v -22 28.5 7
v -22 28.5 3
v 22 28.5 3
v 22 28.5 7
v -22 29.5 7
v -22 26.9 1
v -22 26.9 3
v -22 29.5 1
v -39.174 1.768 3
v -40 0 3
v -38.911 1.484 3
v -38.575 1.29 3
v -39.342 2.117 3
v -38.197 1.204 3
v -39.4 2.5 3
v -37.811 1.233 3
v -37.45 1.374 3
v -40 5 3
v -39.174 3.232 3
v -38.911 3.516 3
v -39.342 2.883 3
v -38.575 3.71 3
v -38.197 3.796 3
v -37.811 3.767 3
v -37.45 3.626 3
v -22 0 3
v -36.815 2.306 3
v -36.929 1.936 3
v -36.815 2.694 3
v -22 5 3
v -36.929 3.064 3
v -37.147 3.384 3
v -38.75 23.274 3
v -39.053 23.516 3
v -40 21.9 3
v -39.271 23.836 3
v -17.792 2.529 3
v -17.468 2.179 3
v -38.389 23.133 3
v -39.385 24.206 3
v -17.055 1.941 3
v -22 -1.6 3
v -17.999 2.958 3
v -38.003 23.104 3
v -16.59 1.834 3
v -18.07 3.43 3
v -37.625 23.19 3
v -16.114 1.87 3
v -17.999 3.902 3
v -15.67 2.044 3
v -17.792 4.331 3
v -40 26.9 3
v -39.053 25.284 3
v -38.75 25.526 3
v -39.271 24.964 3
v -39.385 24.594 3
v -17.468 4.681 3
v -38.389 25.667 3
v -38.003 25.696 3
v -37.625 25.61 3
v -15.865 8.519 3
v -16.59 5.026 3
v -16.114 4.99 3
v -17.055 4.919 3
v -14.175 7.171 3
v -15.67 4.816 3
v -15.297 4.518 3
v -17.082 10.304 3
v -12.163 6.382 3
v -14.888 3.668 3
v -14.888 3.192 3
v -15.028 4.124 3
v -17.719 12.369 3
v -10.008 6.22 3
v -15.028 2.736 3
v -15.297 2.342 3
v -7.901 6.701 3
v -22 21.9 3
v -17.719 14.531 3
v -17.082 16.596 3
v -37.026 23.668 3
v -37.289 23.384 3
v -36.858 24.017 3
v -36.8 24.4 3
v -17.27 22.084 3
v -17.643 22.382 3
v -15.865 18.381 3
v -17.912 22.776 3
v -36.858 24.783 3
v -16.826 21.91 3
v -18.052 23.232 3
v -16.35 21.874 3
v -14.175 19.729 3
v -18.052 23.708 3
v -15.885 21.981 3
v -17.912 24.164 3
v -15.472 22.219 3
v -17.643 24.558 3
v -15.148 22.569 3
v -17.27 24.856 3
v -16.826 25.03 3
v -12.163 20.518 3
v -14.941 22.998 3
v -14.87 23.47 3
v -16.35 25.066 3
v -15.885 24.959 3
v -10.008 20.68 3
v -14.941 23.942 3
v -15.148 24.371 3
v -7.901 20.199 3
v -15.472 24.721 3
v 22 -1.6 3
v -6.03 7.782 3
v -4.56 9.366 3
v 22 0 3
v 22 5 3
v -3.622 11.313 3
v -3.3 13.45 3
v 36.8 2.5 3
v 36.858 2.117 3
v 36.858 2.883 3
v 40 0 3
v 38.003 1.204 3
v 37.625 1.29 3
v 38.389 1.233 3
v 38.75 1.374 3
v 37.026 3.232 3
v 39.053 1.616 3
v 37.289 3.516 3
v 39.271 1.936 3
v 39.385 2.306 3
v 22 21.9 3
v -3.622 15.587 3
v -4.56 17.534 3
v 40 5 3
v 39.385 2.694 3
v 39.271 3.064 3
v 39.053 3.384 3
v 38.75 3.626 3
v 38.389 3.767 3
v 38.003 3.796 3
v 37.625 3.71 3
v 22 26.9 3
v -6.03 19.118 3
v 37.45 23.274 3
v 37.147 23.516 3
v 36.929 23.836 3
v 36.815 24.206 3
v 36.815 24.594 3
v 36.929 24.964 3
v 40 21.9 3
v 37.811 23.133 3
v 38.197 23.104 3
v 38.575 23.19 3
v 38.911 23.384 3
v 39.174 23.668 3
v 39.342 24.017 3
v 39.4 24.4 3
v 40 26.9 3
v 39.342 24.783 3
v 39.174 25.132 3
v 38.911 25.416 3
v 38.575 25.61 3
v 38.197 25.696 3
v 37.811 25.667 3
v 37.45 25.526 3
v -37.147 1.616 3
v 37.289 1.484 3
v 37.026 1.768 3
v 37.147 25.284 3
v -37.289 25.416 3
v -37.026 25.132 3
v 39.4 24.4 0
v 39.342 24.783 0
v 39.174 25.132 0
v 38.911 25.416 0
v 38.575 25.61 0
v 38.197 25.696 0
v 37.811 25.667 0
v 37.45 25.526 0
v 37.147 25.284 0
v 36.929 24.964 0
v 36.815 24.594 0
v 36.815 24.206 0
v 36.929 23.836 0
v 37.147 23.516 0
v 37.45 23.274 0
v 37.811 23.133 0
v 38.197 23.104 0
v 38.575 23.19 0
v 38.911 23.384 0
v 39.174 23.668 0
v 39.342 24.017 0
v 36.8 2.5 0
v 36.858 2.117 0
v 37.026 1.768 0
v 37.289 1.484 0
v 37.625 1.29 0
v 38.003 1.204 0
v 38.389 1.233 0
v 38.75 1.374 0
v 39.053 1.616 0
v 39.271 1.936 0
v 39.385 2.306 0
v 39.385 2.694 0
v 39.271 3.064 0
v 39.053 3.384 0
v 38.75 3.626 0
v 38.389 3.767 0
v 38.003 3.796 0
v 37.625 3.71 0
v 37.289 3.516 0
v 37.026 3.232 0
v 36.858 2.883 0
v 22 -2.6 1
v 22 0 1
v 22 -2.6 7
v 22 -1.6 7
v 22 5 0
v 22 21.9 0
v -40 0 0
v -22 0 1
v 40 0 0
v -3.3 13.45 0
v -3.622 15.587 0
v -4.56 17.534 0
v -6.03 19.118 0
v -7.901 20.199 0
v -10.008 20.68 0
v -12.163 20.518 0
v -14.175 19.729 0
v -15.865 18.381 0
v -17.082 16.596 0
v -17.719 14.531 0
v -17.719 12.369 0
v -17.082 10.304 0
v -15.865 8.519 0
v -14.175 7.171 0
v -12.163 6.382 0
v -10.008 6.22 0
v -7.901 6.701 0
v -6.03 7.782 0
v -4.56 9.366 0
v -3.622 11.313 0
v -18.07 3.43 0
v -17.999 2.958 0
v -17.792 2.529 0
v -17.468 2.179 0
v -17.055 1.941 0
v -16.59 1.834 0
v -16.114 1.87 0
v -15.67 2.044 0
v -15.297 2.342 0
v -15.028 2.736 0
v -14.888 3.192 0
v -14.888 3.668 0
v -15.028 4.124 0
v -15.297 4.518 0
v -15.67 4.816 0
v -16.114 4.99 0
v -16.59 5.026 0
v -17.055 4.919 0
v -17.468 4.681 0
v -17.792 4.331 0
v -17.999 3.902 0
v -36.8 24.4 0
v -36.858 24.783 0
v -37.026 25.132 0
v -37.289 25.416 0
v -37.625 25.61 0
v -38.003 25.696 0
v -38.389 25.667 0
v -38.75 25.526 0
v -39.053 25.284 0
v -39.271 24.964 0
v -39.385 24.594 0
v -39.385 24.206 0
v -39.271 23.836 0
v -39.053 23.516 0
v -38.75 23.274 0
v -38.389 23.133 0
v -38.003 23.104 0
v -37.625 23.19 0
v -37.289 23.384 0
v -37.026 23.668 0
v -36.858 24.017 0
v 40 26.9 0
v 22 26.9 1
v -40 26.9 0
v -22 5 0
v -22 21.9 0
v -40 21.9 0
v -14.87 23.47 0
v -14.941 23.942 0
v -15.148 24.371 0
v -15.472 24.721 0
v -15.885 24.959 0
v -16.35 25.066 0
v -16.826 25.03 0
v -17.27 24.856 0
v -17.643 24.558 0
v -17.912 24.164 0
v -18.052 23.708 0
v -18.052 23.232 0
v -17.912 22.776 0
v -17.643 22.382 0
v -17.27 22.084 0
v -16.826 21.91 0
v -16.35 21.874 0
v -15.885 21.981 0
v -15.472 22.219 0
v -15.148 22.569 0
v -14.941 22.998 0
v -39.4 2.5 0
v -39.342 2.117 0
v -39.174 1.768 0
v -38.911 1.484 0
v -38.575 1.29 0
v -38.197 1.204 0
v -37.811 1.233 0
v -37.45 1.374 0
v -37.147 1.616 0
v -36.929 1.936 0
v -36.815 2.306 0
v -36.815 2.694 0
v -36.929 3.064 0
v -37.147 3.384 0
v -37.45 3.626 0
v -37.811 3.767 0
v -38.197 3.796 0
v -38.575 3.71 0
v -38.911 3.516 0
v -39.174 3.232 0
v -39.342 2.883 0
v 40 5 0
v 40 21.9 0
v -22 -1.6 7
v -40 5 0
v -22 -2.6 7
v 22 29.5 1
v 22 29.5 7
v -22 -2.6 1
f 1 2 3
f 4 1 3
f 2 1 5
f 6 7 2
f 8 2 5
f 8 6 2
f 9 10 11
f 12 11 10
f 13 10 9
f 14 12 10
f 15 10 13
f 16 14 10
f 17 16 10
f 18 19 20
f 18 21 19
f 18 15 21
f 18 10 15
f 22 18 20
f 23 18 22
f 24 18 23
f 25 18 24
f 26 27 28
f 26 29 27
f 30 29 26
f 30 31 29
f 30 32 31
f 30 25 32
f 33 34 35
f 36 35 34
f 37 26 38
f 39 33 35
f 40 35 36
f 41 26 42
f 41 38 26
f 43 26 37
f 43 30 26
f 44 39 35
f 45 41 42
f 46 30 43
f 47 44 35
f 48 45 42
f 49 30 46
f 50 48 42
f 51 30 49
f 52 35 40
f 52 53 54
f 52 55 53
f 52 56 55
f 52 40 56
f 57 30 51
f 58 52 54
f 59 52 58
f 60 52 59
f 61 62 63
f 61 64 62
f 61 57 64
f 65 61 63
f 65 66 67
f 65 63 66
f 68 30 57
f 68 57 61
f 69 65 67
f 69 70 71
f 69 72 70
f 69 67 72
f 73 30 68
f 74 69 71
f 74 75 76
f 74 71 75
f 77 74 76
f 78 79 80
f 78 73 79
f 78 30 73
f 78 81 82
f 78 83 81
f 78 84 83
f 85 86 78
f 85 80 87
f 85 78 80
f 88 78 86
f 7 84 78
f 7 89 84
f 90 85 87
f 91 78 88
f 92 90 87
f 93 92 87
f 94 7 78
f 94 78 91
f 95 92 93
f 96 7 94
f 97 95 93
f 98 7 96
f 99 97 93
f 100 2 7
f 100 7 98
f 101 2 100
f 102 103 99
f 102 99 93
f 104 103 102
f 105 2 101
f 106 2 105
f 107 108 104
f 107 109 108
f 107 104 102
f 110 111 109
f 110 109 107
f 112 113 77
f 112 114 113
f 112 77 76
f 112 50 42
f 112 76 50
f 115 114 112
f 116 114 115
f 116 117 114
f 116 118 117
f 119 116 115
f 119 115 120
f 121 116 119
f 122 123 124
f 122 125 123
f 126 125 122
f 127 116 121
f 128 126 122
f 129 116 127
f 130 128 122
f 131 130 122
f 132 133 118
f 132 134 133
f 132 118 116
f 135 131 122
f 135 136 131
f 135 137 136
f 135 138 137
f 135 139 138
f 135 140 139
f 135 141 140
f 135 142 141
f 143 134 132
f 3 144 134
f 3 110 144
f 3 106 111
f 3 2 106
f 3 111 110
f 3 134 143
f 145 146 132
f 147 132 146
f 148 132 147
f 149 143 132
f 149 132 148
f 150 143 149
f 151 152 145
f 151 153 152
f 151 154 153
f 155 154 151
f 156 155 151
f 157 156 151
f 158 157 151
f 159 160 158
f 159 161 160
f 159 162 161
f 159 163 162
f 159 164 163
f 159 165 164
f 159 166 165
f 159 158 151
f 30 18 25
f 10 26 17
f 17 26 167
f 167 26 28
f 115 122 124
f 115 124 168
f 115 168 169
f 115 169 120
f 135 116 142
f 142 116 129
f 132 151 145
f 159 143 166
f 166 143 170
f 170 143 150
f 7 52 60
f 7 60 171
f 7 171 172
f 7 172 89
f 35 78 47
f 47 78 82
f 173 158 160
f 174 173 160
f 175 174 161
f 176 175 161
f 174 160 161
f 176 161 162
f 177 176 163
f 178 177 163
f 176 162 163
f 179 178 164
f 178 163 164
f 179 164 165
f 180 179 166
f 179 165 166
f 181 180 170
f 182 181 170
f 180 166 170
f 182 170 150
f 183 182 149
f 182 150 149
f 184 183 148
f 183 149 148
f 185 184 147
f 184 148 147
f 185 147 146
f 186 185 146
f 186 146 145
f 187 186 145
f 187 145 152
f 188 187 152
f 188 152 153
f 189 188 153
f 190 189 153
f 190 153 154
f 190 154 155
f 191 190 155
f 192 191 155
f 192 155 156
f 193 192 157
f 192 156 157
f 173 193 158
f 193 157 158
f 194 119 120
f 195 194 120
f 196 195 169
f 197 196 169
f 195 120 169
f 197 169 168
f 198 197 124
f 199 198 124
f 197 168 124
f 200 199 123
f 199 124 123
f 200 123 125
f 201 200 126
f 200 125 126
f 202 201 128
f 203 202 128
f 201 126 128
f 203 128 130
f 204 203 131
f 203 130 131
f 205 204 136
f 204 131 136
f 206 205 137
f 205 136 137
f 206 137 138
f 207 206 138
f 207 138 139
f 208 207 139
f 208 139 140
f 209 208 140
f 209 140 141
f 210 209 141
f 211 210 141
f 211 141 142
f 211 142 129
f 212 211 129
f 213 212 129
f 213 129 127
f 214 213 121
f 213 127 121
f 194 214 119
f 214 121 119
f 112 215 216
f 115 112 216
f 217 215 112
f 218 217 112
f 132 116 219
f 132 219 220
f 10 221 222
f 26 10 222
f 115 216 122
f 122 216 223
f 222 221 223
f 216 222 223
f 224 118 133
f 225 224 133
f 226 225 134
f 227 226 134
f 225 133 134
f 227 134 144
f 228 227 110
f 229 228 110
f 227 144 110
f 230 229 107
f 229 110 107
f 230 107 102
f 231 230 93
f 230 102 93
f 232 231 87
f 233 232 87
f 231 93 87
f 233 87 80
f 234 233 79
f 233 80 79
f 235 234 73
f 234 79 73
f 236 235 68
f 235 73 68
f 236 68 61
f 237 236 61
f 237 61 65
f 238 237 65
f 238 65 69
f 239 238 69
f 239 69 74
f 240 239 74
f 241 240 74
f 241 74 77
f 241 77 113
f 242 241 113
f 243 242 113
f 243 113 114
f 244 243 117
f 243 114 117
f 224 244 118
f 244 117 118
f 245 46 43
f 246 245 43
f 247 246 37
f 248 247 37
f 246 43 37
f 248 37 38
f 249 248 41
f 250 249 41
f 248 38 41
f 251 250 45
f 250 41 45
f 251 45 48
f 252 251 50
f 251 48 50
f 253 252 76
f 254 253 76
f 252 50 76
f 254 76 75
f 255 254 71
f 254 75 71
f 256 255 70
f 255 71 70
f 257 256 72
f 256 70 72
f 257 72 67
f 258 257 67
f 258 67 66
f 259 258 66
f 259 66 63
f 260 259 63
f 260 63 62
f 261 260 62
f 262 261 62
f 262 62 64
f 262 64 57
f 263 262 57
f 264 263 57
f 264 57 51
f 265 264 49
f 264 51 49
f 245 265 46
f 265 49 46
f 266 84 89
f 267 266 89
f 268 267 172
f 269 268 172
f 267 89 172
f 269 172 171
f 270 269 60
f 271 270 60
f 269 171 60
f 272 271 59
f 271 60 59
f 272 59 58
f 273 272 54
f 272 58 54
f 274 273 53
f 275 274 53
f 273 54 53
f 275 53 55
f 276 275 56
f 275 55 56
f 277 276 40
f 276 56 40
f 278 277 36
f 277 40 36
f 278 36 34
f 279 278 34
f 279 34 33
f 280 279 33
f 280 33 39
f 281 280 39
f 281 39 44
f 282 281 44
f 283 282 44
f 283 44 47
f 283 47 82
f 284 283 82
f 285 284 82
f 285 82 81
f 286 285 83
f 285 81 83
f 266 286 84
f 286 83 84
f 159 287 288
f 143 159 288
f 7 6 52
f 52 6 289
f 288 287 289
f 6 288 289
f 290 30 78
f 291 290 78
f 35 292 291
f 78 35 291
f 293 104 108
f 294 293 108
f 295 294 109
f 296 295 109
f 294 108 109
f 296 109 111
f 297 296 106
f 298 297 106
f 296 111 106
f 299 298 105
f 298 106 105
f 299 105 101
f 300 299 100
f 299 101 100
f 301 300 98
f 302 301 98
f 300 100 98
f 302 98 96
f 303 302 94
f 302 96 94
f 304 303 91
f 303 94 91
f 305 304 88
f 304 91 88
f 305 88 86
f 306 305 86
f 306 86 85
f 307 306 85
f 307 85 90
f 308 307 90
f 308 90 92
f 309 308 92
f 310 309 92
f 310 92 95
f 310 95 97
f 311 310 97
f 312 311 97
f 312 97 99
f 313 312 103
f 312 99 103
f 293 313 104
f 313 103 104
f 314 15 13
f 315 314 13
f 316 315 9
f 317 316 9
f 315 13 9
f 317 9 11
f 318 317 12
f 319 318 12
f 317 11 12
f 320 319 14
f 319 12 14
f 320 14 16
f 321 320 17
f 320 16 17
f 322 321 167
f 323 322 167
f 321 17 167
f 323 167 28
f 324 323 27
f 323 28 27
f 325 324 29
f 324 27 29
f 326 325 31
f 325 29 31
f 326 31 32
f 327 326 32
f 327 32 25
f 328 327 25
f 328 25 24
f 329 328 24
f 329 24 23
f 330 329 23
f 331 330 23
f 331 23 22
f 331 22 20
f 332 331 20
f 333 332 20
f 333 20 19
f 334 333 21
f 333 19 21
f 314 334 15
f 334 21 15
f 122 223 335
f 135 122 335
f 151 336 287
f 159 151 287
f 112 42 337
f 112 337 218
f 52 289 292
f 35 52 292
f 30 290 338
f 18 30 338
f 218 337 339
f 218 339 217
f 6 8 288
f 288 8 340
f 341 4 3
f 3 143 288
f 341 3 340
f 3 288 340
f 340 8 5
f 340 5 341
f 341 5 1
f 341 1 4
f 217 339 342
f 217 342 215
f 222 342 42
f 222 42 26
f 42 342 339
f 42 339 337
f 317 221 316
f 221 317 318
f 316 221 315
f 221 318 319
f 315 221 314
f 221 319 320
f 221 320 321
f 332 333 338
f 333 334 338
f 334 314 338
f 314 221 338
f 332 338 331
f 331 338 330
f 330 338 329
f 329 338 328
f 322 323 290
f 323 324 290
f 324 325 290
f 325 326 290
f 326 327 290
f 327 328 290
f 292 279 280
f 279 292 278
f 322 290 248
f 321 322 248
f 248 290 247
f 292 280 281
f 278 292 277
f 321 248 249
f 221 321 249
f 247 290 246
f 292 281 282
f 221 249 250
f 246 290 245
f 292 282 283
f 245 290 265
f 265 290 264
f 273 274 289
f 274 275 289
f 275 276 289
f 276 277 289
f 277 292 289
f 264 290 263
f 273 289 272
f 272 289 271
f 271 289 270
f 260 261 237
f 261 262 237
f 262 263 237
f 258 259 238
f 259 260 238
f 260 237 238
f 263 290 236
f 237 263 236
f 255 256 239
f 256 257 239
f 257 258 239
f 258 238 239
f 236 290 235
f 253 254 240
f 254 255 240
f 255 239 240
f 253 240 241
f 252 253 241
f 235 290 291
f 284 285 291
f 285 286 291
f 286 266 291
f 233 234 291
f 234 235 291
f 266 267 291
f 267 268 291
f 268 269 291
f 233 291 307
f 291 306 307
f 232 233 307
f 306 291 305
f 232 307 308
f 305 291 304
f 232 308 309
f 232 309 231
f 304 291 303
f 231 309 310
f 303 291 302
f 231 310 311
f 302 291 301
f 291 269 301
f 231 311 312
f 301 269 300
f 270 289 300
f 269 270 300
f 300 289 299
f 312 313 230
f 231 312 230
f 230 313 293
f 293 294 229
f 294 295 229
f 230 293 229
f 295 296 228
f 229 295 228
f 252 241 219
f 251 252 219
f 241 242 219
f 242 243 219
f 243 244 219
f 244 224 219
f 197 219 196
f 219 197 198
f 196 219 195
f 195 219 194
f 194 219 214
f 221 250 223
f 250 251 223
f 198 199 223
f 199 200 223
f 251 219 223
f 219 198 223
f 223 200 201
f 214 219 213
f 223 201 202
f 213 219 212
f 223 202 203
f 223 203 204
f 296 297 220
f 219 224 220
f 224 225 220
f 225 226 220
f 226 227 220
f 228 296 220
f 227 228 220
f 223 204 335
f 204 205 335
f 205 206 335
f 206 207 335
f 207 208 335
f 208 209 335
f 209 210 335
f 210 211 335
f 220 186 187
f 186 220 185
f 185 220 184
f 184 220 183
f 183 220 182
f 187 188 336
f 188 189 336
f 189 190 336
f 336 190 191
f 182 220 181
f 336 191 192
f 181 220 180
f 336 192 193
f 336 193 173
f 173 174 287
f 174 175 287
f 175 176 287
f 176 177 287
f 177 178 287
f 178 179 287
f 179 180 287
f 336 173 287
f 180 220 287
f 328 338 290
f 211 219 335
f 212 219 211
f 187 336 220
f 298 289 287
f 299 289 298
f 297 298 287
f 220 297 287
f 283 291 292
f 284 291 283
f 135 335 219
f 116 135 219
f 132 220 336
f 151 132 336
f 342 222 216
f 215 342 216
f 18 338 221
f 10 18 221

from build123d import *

# Parameters (mm, degrees)
RESSALTO_EXTRUS_O1_DEPTH = 3
ESBO_O2_R                = 1.3
CORTE_EXTRUS_O1_DEPTH    = 3
ESBO_O3_W                = 2
ESBO_O3_H                = 16.9
RESSALTO_EXTRUS_O2_DEPTH = 3
ESBO_O4_R                = 7.25
CORTE_EXTRUS_O2_DEPTH    = 3
ESBO_O6_R                = 1.6
CORTE_EXTRUS_O3_DEPTH    = 3
ESBO_O7_W                = 44
ESBO_O7_H                = 2.6
RESSALTO_EXTRUS_O4_DEPTH = 2
ESBO_O8_W                = 44
ESBO_O8_H                = 1
RESSALTO_EXTRUS_O5_DEPTH = 4


with BuildPart() as part:
    # Esboço1 → Ressalto-extrusão1 (new body)
    with BuildSketch(Plane.XY):
        Polygon((-40, 0), (40, 0), (40, 5), (20, 5), (20, 21.9), (40, 21.9), (40, 26.9), (-40, 26.9), (-40, 21.9), (-20, 21.9), (-20, 5), (-40, 5), align=None)
    extrude(amount=RESSALTO_EXTRUS_O1_DEPTH)

    # Esboço2 → Corte-extrusão1 (cut)
    with BuildSketch(Plane.XY.offset(3)):
        with Locations((-38.1, 24.4)):
            Circle(ESBO_O2_R)
        with Locations((38.1, 24.4)):
            Circle(ESBO_O2_R)
        with Locations(Location((38.1, 2.5, 0), (0, 0, 180))):
            Circle(ESBO_O2_R)
        with Locations(Location((-38.1, 2.5, 0), (0, 0, 180))):
            Circle(ESBO_O2_R)
    extrude(amount=-CORTE_EXTRUS_O1_DEPTH, mode=Mode.SUBTRACT)

    # Esboço3 → Ressalto-extrusão2 (add)
    with BuildSketch(Plane.XY.offset(3)):
        with Locations((-21, 13.45)):
            Rectangle(ESBO_O3_W, ESBO_O3_H)
        with Locations((21, 13.45)):
            Rectangle(ESBO_O3_W, ESBO_O3_H)
    extrude(amount=-RESSALTO_EXTRUS_O2_DEPTH)

    # Esboço4 → Corte-extrusão2 (cut)
    with BuildSketch(Plane.XY.offset(3)):
        with Locations((-10.55, 13.45)):
            Circle(ESBO_O4_R)
    extrude(amount=-CORTE_EXTRUS_O2_DEPTH, mode=Mode.SUBTRACT)

    # Esboço6 → Corte-extrusão3 (cut)
    with BuildSketch(Plane.XY.offset(3)):
        with Locations((-16.47, 23.47)):
            Circle(ESBO_O6_R)
        with Locations(Location((-16.47, 3.43, 0), (0, 0, 180))):
            Circle(ESBO_O6_R)
    extrude(amount=-CORTE_EXTRUS_O3_DEPTH, mode=Mode.SUBTRACT)

    # Esboço7 → Ressalto-extrusão4 (add)
    with BuildSketch(Plane.XY.offset(3)):
        with Locations((0, 28.2)):
            Rectangle(ESBO_O7_W, ESBO_O7_H)
        with Locations((0, -1.3)):
            Rectangle(ESBO_O7_W, ESBO_O7_H)
    extrude(amount=-RESSALTO_EXTRUS_O4_DEPTH)

    # Esboço8 → Ressalto-extrusão5 (add)
    with BuildSketch(Plane.XY.offset(3)):
        with Locations((0, 29)):
            Rectangle(ESBO_O8_W, ESBO_O8_H)
        with Locations((0, -2.1)):
            Rectangle(ESBO_O8_W, ESBO_O8_H)
    extrude(amount=RESSALTO_EXTRUS_O5_DEPTH)


solid = part.part
